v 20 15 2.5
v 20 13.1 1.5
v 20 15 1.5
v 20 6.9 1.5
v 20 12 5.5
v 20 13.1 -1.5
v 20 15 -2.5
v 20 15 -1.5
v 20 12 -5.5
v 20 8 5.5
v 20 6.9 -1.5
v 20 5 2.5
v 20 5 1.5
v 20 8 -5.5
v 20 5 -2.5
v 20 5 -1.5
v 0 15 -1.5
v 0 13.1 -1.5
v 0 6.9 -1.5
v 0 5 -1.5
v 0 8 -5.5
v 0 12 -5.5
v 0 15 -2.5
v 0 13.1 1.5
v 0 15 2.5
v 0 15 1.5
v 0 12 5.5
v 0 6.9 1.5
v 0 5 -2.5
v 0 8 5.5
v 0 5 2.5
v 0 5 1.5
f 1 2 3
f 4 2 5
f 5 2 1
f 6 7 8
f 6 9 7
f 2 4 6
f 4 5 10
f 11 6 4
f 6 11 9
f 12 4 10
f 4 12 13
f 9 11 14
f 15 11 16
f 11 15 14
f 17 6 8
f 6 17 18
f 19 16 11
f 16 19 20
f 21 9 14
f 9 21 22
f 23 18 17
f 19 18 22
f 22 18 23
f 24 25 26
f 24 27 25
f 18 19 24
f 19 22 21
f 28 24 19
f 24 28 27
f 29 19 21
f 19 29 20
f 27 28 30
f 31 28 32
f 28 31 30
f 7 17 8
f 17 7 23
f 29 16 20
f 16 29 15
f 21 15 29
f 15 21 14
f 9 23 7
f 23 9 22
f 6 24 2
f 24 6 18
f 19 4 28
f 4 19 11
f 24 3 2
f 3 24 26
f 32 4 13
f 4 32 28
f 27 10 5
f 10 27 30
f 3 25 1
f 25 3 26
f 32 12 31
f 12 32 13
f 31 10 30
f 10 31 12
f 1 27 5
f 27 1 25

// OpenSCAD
slider();
mirror([0, 0, 1]) slider();


module slider() {
	translate([10, 10, -1]) cube([20, 6.2, 2], center=true);
	difference() {
		translate([10, 10, -3.5]) cube([20, 10, 4], center=true);
		translate([-0.1, 5, -2.5]) rotate([-135, 0, 0]) cube([20.2, 10, 10]);
		translate([-0.1, 15, -2.5]) rotate([-135, 0, 0]) cube([20.2, 10, 10]);
	}
}
